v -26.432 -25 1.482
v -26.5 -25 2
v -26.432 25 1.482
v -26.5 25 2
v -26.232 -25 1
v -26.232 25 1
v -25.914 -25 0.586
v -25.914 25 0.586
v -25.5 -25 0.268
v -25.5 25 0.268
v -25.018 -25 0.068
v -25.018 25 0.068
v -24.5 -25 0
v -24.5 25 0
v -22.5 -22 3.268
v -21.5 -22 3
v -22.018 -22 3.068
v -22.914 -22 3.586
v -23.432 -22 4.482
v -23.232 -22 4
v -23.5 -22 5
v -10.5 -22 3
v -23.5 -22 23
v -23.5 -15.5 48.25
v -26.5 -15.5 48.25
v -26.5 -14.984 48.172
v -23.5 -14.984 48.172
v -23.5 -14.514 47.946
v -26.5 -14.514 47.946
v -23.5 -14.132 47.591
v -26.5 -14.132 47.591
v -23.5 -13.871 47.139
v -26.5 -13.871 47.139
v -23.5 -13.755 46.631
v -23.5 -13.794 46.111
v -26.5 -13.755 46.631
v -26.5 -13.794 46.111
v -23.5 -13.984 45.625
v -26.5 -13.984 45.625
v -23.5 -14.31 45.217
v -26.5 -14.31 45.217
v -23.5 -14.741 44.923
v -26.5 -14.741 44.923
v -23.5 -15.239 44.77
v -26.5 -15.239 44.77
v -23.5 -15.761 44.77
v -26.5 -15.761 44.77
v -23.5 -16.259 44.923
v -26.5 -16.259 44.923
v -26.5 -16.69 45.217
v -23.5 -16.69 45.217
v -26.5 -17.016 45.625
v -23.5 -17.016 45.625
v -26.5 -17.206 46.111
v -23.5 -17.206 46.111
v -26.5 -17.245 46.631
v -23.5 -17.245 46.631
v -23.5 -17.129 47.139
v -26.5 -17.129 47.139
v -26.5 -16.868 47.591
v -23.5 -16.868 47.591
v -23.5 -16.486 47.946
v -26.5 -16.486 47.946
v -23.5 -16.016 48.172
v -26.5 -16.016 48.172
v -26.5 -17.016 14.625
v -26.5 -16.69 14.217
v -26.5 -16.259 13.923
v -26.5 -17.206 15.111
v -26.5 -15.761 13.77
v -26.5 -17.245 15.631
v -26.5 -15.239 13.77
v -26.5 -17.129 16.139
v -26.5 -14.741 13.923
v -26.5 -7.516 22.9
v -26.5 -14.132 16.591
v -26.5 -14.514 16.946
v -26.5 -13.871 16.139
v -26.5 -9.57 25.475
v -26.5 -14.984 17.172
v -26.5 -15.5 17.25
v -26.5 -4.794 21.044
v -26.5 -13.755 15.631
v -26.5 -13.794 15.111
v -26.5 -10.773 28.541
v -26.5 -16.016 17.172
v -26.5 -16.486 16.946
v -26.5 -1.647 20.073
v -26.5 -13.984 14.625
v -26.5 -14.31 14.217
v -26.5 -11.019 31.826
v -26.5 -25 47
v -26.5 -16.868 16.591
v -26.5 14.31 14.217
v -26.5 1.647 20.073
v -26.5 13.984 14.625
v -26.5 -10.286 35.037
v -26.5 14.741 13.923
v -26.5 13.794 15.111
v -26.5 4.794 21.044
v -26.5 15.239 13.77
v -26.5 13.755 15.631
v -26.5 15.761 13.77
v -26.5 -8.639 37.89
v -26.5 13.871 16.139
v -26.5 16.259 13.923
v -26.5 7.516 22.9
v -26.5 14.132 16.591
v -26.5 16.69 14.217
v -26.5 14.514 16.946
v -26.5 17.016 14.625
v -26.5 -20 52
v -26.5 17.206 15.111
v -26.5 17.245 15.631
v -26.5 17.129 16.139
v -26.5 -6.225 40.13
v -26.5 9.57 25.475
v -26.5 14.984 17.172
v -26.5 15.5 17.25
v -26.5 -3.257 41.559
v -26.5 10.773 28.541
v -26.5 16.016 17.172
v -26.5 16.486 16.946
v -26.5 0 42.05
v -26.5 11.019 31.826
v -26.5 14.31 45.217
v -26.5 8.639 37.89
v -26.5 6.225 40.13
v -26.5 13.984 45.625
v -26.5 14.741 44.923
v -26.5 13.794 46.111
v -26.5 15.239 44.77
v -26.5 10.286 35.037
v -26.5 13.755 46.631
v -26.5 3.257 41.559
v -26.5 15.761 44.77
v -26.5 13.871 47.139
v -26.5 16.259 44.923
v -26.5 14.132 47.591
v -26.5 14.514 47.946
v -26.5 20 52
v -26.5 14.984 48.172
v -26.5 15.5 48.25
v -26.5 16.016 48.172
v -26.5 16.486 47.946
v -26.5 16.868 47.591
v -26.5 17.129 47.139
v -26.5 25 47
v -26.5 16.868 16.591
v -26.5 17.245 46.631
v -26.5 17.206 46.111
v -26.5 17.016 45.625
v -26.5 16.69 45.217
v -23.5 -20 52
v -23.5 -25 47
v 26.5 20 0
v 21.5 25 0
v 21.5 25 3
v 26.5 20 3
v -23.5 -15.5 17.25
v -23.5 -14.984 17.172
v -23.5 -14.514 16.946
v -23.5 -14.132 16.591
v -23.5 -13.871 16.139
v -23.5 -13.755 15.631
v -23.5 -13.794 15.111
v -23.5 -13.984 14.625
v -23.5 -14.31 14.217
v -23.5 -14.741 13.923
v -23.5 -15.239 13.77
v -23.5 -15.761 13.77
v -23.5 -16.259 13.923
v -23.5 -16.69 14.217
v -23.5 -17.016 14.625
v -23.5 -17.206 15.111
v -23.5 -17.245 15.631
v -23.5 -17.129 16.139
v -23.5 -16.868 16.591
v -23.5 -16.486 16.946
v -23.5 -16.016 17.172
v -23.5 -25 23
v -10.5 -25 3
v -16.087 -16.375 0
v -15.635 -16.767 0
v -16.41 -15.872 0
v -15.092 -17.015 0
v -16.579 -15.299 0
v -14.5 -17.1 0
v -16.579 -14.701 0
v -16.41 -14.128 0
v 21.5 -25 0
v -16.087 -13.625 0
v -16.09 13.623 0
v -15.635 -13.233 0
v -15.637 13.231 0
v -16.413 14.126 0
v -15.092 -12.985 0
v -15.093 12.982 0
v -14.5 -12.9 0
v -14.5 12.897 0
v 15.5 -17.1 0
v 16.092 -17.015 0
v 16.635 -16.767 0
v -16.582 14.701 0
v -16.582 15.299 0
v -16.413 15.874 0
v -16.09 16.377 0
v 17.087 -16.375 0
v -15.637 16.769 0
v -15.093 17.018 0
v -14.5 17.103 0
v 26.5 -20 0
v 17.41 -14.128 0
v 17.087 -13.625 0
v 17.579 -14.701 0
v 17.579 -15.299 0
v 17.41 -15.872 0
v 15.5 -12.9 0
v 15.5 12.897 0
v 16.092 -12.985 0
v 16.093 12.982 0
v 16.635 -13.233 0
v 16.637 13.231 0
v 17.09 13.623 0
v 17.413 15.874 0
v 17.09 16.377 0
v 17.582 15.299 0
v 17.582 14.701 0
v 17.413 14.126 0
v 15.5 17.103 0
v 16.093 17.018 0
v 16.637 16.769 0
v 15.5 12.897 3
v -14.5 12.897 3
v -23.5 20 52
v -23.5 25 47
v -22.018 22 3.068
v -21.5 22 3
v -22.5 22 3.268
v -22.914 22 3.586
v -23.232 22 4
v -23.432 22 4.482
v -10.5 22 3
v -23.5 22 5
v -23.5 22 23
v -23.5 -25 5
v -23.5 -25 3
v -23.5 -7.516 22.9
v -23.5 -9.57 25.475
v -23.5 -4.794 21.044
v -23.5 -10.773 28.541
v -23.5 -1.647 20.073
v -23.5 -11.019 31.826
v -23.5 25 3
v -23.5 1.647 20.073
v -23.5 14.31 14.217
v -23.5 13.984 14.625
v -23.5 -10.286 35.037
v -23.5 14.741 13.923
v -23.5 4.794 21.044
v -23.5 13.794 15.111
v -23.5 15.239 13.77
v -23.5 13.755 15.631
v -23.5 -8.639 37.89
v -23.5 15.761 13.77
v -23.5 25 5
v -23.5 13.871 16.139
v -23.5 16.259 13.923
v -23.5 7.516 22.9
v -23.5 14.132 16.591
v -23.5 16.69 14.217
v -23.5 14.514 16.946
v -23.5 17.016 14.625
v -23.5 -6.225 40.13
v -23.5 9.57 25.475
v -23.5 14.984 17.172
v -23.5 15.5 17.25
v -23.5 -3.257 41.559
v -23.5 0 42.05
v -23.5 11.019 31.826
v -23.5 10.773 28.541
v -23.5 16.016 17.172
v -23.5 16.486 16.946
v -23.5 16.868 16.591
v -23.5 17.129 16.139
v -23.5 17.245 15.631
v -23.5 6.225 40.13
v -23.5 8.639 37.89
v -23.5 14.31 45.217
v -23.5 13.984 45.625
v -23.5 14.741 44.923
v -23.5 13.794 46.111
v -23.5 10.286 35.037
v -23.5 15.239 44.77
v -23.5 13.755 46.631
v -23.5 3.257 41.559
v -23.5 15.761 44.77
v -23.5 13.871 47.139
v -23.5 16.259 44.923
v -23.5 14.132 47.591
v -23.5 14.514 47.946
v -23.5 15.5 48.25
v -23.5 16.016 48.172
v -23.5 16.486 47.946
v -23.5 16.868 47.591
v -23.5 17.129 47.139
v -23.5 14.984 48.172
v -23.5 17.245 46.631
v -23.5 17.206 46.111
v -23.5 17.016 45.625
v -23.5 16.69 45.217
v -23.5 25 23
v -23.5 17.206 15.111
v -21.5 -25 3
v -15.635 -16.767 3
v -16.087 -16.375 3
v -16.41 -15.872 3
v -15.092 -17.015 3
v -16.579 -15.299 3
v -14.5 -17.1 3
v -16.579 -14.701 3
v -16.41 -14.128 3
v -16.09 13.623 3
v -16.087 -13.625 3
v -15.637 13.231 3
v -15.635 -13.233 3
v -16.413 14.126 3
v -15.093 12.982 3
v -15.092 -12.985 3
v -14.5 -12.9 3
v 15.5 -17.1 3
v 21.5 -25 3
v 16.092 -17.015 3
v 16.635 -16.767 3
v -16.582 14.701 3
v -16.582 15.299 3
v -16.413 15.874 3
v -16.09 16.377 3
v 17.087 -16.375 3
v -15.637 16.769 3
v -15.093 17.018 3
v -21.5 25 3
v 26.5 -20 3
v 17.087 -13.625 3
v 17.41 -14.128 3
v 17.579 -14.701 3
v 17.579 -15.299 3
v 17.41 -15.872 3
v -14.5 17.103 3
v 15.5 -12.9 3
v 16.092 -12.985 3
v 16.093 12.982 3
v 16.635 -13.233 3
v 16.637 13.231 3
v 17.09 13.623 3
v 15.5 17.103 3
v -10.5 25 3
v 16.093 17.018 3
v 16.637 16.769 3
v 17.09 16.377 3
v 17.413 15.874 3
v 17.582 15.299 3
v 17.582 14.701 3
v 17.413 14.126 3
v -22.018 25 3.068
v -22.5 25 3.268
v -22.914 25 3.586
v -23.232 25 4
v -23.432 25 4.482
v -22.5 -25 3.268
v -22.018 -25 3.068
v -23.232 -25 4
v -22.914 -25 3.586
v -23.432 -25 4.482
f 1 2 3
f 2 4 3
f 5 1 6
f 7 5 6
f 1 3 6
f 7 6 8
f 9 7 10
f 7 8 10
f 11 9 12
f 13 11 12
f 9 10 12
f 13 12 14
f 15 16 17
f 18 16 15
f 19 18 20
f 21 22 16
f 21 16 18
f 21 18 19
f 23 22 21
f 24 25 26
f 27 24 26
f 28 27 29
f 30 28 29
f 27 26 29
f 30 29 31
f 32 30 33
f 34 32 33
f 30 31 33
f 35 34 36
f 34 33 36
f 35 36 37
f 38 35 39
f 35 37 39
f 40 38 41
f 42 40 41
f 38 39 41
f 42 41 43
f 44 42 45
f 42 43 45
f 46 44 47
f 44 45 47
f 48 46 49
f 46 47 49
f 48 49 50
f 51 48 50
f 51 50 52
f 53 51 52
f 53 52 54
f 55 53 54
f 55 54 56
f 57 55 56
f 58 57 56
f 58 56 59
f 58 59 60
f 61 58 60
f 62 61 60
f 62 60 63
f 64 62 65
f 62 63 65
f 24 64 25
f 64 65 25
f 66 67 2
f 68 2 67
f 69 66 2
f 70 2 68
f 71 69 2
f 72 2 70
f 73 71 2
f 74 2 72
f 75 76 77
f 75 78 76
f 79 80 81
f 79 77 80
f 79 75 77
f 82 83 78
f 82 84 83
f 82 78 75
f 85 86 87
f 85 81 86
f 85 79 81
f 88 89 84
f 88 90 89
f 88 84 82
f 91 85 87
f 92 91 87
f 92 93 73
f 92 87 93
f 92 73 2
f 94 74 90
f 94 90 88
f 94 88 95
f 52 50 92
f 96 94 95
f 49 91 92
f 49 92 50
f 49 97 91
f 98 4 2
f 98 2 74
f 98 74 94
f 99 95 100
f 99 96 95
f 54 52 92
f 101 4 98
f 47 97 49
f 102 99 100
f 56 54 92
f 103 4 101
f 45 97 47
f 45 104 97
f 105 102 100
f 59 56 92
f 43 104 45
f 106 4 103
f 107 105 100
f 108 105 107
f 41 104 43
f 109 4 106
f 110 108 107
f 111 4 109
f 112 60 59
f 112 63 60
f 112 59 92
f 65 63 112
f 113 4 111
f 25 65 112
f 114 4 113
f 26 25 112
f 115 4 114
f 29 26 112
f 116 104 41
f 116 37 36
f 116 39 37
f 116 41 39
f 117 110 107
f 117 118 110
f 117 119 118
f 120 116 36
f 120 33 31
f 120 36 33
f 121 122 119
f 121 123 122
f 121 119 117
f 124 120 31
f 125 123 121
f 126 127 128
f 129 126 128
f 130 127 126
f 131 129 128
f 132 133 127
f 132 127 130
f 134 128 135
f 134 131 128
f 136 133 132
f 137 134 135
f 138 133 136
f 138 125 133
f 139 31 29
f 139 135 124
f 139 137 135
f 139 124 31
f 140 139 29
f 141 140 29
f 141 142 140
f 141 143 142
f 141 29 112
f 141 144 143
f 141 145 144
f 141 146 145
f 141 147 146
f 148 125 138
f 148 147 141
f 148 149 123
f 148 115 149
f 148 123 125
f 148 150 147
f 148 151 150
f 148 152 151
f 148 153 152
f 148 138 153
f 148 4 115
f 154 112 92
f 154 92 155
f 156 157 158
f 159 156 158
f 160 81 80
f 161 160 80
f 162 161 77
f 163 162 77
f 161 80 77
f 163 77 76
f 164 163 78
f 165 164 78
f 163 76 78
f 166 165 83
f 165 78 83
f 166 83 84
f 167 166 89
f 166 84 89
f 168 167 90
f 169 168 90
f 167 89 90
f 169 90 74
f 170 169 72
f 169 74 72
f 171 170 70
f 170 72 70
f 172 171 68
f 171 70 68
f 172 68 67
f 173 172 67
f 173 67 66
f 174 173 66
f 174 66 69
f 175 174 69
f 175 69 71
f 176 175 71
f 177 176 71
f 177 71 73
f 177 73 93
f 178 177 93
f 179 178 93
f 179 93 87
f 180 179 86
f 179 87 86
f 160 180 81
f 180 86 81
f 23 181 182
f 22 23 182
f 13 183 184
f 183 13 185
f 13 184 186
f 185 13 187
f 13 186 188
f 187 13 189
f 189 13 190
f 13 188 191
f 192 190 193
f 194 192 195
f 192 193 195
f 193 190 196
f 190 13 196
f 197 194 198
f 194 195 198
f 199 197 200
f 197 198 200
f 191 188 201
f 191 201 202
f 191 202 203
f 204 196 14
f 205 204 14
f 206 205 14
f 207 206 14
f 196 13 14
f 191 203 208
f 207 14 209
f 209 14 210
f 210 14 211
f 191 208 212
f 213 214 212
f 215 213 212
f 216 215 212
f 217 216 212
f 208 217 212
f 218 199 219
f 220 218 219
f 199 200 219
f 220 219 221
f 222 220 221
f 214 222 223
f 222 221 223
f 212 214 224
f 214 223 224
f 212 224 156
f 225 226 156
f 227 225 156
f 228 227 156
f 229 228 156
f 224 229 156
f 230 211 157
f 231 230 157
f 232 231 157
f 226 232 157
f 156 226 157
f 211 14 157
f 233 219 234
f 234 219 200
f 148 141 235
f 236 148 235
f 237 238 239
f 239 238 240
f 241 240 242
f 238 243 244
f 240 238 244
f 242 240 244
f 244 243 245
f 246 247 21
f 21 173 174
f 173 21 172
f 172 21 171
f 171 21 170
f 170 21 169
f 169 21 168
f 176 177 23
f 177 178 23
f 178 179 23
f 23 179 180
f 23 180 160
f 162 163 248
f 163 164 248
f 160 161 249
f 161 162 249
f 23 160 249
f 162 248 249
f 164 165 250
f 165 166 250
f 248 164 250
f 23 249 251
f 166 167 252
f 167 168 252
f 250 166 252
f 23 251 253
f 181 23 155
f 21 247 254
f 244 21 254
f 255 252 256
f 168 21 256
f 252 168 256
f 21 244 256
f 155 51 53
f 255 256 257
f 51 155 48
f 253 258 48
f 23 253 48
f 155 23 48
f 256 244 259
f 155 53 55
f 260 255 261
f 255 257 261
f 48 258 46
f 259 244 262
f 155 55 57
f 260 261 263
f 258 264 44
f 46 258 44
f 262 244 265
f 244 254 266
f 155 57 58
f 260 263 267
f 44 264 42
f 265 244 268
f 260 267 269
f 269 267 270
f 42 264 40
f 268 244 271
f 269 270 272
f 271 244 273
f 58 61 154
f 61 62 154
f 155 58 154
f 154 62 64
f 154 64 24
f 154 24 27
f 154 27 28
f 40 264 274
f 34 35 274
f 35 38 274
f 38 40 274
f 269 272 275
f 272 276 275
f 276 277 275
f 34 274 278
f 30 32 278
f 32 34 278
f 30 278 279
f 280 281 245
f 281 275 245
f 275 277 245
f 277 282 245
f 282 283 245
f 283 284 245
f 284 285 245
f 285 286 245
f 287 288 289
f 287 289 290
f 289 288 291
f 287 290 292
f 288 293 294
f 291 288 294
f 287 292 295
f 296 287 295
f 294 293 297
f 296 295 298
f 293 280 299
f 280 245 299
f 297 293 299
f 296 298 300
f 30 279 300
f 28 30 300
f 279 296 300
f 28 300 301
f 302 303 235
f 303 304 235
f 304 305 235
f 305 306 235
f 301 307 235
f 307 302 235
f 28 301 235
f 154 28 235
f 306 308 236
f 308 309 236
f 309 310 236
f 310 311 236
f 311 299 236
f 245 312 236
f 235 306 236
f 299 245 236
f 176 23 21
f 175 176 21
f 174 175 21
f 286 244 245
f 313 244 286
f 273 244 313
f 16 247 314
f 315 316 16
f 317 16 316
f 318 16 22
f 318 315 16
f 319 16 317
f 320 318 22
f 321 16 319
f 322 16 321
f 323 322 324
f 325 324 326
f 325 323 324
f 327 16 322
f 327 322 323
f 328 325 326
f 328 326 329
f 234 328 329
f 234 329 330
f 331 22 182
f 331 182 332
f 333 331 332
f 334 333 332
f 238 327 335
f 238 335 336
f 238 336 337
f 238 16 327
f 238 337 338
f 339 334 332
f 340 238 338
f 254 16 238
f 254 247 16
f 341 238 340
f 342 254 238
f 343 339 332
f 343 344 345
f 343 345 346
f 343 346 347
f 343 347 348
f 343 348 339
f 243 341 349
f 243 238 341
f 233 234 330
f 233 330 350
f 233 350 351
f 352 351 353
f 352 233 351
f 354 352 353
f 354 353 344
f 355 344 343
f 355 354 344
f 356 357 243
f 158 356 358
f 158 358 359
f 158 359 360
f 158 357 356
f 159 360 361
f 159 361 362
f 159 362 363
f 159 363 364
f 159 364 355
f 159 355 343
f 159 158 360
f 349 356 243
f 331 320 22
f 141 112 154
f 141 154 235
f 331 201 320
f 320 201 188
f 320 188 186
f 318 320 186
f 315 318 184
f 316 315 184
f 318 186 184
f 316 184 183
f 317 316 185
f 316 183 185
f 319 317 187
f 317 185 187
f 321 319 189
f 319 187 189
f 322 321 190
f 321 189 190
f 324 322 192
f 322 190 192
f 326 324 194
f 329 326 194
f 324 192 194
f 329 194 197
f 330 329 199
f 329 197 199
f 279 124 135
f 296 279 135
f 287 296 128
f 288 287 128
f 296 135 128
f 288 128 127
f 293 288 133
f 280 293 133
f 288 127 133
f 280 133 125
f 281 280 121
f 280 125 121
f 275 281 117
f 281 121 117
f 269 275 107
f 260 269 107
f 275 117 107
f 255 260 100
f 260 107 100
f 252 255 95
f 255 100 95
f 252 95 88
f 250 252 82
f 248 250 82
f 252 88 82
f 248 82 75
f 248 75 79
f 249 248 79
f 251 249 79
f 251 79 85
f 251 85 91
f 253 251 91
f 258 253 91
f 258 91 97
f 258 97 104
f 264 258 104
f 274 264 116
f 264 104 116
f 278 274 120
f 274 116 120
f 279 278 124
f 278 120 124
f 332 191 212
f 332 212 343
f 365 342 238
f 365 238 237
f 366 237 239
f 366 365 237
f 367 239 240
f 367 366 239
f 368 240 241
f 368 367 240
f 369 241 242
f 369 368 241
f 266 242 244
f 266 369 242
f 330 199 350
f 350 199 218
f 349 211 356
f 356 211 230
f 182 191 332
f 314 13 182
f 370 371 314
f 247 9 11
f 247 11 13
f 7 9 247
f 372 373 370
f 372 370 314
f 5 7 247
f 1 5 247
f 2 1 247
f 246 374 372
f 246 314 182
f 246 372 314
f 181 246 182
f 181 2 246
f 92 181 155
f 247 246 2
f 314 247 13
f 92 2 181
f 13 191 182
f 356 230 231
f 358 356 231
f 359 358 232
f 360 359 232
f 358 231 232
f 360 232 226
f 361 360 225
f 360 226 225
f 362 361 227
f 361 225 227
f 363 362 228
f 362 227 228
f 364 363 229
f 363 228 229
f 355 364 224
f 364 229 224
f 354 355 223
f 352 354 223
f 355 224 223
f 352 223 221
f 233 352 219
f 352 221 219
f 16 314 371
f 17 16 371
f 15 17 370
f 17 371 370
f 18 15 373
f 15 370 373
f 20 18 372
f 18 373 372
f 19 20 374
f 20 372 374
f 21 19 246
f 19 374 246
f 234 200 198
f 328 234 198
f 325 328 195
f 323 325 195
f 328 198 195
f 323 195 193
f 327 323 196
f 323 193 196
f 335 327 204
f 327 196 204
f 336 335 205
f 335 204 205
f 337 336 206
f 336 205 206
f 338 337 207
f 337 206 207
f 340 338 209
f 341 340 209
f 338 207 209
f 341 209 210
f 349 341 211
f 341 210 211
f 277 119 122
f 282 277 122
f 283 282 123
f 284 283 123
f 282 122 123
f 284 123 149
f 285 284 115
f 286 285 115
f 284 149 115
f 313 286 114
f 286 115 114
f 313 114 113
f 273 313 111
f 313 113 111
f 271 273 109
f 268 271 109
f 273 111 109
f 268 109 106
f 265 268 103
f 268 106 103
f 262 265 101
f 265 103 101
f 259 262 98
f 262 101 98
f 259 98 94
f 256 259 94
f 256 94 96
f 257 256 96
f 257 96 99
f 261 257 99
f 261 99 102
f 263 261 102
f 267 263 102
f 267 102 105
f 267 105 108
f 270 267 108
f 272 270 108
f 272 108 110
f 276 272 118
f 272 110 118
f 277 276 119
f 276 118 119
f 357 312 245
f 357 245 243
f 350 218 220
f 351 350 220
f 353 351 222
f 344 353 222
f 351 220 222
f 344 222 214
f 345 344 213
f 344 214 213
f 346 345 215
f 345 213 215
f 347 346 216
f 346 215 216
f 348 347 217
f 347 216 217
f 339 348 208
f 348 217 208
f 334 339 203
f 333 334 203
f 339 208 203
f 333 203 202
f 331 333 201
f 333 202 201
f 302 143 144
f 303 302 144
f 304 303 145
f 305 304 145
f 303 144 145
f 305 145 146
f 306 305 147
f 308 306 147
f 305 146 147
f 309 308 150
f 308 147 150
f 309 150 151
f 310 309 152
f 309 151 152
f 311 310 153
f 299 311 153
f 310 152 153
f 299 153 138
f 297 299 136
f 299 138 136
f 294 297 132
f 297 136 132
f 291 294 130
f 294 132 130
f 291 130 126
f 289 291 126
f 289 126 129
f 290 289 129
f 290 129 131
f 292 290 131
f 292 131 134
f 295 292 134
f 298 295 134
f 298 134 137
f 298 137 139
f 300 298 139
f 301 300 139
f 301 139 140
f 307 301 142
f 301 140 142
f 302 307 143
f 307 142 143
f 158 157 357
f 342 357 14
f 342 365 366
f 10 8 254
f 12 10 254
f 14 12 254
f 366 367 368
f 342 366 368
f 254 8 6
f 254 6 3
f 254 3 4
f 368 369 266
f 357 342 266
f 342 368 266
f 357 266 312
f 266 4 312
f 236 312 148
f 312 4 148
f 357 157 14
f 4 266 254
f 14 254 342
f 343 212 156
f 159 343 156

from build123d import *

# Parameters (mm, degrees)
SKETCH_1_W      = 53
SKETCH_1_H      = 50
EXTRUDE_1_DEPTH = 3
SKETCH_2_W      = 49
SKETCH_2_H      = 50
SKETCH_2_R      = 11.05
SKETCH_2_R_2    = 1.75
EXTRUDE_2_DEPTH = 3
CHAMFER_1_SIZE  = 5
EXTRUDE_3_DEPTH = 3
FILLET_1_R      = 2


with BuildPart() as part:
    # 草图1 → 凸台-拉伸1 (new body)
    with BuildSketch(Plane.XY):
        Rectangle(SKETCH_1_W, SKETCH_1_H)
        with BuildLine():
            Line((-14.5, 17.103323548), (15.5, 17.103323548))
            ThreePointArc((15.5, 17.103323548), (17.603323548, 15), (15.5, 12.896676452))
            Line((15.5, 12.896676452), (-14.5, 12.896676452))
            ThreePointArc((-14.5, 12.896676452), (-16.603323548, 15), (-14.5, 17.103323548))
        make_face(mode=Mode.SUBTRACT)
        with BuildLine():
            Line((-14.5, -12.9), (15.5, -12.9))
            ThreePointArc((15.5, -12.9), (17.6, -15), (15.5, -17.1))
            Line((15.5, -17.1), (-14.5, -17.1))
            ThreePointArc((-14.5, -17.1), (-16.6, -15), (-14.5, -12.9))
        make_face(mode=Mode.SUBTRACT)
    extrude(amount=EXTRUDE_1_DEPTH)

    # 草图2 → 凸台-拉伸2 (add)
    with BuildSketch(Plane.ZY.offset(26.5)):
        with Locations((27.5, 0)):
            Rectangle(SKETCH_2_W, SKETCH_2_H)
        with Locations((31, 0)):
            Circle(SKETCH_2_R, mode=Mode.SUBTRACT)
        with Locations((46.5, 15.5)):
            Circle(SKETCH_2_R_2, mode=Mode.SUBTRACT)
        with Locations((46.5, -15.5)):
            Circle(SKETCH_2_R_2, mode=Mode.SUBTRACT)
        with Locations((15.5, -15.5)):
            Circle(SKETCH_2_R_2, mode=Mode.SUBTRACT)
        with Locations((15.5, 15.5)):
            Circle(SKETCH_2_R_2, mode=Mode.SUBTRACT)
    extrude(amount=-EXTRUDE_2_DEPTH)

    # 倒角1
    chamfer_1_edges = [part.edges().sort_by_distance(p)[0] for p in [
        (-25, 25, 52),
        (-25, -25, 52),
        (26.5, 25, 1.5),
        (26.5, -25, 1.5),
    ]]
    chamfer(chamfer_1_edges, length=CHAMFER_1_SIZE)

    # 草图3 → 凸台-拉伸3 (add)
    with BuildSketch(Plane.XZ.offset(25)):
        with BuildLine():
            Line((-23.5, 5), (-23.5, 23))
            Line((-23.5, 23), (-10.5, 3))
            Line((-10.5, 3), (-21.5, 3))
            ThreePointArc((-21.5, 3), (-22.914213562, 3.585786438), (-23.5, 5))
        make_face()
    extrude_3 = extrude(amount=-EXTRUDE_3_DEPTH)

    # 圆角1
    fillet_1_edges = [part.edges().sort_by_distance(p)[0] for p in [
        (-26.5, 0, 0),
    ]]
    fillet(fillet_1_edges, radius=FILLET_1_R)

    # 镜向1: 凸台-拉伸3 across plane
    add(extrude_3.mirror(Plane.ZX))


solid = part.part
